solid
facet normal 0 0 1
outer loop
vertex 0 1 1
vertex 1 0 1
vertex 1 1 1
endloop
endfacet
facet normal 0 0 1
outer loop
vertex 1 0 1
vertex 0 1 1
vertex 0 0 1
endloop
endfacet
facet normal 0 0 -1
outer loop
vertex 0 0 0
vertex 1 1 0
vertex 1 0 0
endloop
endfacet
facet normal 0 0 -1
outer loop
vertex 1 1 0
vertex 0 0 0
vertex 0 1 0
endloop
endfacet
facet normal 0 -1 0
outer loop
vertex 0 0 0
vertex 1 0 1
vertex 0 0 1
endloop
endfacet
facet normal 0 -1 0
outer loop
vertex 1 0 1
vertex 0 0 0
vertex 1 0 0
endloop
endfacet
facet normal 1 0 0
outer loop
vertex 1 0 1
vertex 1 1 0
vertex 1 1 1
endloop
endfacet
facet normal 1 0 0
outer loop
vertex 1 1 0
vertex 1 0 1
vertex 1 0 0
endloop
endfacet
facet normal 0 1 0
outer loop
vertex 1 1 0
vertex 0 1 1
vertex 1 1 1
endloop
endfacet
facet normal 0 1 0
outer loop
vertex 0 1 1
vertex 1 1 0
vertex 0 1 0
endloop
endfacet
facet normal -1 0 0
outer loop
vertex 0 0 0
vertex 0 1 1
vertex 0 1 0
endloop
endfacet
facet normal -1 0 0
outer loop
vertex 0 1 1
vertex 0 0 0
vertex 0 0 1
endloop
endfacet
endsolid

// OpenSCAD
matrix_3x3 = [[10,20,30],[10,20,30],[10,20,30]];
vector = [2,0,0];
matrix_3x2 = [[1,0,0],[1,0,0]];

group0 = ["3x3matrix","vector","number","3x2matrix"];
group1 = [	matrix_3x3, vector, 2, matrix_3x2];

function multiply(a,b) = a * b;
function divide(a,b) = a / b;
function add(a,b) = a + b;
function minus(a,b) = a - b;
function modulus(a,b) = a % b;

function lt(a,b) = a < b;
function lte(a,b) = a <= b;
function eq(a,b) = a == b;
function neq(a,b) = a != b;
function gt(a,b) = a > b;
function gte(a,b) = a >= b;

group1_len = len(group1);
for (i = [0:group1_len-1]){
	for (j = [0:group1_len-1]){
		echo(str(group0[i]," * ",group0[j], " = "),multiply(group1[i],group1[j]));
		echo(str(group0[i]," / ",group0[j], " = "),divide(group1[i],group1[j]));
		echo(str(group0[i]," + ",group0[j], " = "),add(group1[i],group1[j]));
		echo(str(group0[i]," - ",group0[j], " = "),minus(group1[i],group1[j]));
		echo(str(group0[i]," % ",group0[j], " = "),modulus(group1[i],group1[j]));
		echo(str(group0[i]," < ",group0[j], " = "),lt(group1[i],group1[j]));
		echo(str(group0[i]," <= ",group0[j], " = "),lte(group1[i],group1[j]));
		echo(str(group0[i]," == ",group0[j], " = "),eq(group1[i],group1[j]));
		echo(str(group0[i]," != ",group0[j], " = "),neq(group1[i],group1[j]));
		echo(str(group0[i]," > ",group0[j], " = "),gt(group1[i],group1[j]));
		echo(str(group0[i]," >= ",group0[j], " = "),gte(group1[i],group1[j]));
	}
}
echo("----");
echo("!");
echo("! matrix ", !matrix_3x3);
echo("! vector ", !vector);
echo("----");

echo("?:");
echo("?: matrix ", matrix_3x3?true:false);
echo("?: vextor ", vector?true:false);
echo("----");

cube();
